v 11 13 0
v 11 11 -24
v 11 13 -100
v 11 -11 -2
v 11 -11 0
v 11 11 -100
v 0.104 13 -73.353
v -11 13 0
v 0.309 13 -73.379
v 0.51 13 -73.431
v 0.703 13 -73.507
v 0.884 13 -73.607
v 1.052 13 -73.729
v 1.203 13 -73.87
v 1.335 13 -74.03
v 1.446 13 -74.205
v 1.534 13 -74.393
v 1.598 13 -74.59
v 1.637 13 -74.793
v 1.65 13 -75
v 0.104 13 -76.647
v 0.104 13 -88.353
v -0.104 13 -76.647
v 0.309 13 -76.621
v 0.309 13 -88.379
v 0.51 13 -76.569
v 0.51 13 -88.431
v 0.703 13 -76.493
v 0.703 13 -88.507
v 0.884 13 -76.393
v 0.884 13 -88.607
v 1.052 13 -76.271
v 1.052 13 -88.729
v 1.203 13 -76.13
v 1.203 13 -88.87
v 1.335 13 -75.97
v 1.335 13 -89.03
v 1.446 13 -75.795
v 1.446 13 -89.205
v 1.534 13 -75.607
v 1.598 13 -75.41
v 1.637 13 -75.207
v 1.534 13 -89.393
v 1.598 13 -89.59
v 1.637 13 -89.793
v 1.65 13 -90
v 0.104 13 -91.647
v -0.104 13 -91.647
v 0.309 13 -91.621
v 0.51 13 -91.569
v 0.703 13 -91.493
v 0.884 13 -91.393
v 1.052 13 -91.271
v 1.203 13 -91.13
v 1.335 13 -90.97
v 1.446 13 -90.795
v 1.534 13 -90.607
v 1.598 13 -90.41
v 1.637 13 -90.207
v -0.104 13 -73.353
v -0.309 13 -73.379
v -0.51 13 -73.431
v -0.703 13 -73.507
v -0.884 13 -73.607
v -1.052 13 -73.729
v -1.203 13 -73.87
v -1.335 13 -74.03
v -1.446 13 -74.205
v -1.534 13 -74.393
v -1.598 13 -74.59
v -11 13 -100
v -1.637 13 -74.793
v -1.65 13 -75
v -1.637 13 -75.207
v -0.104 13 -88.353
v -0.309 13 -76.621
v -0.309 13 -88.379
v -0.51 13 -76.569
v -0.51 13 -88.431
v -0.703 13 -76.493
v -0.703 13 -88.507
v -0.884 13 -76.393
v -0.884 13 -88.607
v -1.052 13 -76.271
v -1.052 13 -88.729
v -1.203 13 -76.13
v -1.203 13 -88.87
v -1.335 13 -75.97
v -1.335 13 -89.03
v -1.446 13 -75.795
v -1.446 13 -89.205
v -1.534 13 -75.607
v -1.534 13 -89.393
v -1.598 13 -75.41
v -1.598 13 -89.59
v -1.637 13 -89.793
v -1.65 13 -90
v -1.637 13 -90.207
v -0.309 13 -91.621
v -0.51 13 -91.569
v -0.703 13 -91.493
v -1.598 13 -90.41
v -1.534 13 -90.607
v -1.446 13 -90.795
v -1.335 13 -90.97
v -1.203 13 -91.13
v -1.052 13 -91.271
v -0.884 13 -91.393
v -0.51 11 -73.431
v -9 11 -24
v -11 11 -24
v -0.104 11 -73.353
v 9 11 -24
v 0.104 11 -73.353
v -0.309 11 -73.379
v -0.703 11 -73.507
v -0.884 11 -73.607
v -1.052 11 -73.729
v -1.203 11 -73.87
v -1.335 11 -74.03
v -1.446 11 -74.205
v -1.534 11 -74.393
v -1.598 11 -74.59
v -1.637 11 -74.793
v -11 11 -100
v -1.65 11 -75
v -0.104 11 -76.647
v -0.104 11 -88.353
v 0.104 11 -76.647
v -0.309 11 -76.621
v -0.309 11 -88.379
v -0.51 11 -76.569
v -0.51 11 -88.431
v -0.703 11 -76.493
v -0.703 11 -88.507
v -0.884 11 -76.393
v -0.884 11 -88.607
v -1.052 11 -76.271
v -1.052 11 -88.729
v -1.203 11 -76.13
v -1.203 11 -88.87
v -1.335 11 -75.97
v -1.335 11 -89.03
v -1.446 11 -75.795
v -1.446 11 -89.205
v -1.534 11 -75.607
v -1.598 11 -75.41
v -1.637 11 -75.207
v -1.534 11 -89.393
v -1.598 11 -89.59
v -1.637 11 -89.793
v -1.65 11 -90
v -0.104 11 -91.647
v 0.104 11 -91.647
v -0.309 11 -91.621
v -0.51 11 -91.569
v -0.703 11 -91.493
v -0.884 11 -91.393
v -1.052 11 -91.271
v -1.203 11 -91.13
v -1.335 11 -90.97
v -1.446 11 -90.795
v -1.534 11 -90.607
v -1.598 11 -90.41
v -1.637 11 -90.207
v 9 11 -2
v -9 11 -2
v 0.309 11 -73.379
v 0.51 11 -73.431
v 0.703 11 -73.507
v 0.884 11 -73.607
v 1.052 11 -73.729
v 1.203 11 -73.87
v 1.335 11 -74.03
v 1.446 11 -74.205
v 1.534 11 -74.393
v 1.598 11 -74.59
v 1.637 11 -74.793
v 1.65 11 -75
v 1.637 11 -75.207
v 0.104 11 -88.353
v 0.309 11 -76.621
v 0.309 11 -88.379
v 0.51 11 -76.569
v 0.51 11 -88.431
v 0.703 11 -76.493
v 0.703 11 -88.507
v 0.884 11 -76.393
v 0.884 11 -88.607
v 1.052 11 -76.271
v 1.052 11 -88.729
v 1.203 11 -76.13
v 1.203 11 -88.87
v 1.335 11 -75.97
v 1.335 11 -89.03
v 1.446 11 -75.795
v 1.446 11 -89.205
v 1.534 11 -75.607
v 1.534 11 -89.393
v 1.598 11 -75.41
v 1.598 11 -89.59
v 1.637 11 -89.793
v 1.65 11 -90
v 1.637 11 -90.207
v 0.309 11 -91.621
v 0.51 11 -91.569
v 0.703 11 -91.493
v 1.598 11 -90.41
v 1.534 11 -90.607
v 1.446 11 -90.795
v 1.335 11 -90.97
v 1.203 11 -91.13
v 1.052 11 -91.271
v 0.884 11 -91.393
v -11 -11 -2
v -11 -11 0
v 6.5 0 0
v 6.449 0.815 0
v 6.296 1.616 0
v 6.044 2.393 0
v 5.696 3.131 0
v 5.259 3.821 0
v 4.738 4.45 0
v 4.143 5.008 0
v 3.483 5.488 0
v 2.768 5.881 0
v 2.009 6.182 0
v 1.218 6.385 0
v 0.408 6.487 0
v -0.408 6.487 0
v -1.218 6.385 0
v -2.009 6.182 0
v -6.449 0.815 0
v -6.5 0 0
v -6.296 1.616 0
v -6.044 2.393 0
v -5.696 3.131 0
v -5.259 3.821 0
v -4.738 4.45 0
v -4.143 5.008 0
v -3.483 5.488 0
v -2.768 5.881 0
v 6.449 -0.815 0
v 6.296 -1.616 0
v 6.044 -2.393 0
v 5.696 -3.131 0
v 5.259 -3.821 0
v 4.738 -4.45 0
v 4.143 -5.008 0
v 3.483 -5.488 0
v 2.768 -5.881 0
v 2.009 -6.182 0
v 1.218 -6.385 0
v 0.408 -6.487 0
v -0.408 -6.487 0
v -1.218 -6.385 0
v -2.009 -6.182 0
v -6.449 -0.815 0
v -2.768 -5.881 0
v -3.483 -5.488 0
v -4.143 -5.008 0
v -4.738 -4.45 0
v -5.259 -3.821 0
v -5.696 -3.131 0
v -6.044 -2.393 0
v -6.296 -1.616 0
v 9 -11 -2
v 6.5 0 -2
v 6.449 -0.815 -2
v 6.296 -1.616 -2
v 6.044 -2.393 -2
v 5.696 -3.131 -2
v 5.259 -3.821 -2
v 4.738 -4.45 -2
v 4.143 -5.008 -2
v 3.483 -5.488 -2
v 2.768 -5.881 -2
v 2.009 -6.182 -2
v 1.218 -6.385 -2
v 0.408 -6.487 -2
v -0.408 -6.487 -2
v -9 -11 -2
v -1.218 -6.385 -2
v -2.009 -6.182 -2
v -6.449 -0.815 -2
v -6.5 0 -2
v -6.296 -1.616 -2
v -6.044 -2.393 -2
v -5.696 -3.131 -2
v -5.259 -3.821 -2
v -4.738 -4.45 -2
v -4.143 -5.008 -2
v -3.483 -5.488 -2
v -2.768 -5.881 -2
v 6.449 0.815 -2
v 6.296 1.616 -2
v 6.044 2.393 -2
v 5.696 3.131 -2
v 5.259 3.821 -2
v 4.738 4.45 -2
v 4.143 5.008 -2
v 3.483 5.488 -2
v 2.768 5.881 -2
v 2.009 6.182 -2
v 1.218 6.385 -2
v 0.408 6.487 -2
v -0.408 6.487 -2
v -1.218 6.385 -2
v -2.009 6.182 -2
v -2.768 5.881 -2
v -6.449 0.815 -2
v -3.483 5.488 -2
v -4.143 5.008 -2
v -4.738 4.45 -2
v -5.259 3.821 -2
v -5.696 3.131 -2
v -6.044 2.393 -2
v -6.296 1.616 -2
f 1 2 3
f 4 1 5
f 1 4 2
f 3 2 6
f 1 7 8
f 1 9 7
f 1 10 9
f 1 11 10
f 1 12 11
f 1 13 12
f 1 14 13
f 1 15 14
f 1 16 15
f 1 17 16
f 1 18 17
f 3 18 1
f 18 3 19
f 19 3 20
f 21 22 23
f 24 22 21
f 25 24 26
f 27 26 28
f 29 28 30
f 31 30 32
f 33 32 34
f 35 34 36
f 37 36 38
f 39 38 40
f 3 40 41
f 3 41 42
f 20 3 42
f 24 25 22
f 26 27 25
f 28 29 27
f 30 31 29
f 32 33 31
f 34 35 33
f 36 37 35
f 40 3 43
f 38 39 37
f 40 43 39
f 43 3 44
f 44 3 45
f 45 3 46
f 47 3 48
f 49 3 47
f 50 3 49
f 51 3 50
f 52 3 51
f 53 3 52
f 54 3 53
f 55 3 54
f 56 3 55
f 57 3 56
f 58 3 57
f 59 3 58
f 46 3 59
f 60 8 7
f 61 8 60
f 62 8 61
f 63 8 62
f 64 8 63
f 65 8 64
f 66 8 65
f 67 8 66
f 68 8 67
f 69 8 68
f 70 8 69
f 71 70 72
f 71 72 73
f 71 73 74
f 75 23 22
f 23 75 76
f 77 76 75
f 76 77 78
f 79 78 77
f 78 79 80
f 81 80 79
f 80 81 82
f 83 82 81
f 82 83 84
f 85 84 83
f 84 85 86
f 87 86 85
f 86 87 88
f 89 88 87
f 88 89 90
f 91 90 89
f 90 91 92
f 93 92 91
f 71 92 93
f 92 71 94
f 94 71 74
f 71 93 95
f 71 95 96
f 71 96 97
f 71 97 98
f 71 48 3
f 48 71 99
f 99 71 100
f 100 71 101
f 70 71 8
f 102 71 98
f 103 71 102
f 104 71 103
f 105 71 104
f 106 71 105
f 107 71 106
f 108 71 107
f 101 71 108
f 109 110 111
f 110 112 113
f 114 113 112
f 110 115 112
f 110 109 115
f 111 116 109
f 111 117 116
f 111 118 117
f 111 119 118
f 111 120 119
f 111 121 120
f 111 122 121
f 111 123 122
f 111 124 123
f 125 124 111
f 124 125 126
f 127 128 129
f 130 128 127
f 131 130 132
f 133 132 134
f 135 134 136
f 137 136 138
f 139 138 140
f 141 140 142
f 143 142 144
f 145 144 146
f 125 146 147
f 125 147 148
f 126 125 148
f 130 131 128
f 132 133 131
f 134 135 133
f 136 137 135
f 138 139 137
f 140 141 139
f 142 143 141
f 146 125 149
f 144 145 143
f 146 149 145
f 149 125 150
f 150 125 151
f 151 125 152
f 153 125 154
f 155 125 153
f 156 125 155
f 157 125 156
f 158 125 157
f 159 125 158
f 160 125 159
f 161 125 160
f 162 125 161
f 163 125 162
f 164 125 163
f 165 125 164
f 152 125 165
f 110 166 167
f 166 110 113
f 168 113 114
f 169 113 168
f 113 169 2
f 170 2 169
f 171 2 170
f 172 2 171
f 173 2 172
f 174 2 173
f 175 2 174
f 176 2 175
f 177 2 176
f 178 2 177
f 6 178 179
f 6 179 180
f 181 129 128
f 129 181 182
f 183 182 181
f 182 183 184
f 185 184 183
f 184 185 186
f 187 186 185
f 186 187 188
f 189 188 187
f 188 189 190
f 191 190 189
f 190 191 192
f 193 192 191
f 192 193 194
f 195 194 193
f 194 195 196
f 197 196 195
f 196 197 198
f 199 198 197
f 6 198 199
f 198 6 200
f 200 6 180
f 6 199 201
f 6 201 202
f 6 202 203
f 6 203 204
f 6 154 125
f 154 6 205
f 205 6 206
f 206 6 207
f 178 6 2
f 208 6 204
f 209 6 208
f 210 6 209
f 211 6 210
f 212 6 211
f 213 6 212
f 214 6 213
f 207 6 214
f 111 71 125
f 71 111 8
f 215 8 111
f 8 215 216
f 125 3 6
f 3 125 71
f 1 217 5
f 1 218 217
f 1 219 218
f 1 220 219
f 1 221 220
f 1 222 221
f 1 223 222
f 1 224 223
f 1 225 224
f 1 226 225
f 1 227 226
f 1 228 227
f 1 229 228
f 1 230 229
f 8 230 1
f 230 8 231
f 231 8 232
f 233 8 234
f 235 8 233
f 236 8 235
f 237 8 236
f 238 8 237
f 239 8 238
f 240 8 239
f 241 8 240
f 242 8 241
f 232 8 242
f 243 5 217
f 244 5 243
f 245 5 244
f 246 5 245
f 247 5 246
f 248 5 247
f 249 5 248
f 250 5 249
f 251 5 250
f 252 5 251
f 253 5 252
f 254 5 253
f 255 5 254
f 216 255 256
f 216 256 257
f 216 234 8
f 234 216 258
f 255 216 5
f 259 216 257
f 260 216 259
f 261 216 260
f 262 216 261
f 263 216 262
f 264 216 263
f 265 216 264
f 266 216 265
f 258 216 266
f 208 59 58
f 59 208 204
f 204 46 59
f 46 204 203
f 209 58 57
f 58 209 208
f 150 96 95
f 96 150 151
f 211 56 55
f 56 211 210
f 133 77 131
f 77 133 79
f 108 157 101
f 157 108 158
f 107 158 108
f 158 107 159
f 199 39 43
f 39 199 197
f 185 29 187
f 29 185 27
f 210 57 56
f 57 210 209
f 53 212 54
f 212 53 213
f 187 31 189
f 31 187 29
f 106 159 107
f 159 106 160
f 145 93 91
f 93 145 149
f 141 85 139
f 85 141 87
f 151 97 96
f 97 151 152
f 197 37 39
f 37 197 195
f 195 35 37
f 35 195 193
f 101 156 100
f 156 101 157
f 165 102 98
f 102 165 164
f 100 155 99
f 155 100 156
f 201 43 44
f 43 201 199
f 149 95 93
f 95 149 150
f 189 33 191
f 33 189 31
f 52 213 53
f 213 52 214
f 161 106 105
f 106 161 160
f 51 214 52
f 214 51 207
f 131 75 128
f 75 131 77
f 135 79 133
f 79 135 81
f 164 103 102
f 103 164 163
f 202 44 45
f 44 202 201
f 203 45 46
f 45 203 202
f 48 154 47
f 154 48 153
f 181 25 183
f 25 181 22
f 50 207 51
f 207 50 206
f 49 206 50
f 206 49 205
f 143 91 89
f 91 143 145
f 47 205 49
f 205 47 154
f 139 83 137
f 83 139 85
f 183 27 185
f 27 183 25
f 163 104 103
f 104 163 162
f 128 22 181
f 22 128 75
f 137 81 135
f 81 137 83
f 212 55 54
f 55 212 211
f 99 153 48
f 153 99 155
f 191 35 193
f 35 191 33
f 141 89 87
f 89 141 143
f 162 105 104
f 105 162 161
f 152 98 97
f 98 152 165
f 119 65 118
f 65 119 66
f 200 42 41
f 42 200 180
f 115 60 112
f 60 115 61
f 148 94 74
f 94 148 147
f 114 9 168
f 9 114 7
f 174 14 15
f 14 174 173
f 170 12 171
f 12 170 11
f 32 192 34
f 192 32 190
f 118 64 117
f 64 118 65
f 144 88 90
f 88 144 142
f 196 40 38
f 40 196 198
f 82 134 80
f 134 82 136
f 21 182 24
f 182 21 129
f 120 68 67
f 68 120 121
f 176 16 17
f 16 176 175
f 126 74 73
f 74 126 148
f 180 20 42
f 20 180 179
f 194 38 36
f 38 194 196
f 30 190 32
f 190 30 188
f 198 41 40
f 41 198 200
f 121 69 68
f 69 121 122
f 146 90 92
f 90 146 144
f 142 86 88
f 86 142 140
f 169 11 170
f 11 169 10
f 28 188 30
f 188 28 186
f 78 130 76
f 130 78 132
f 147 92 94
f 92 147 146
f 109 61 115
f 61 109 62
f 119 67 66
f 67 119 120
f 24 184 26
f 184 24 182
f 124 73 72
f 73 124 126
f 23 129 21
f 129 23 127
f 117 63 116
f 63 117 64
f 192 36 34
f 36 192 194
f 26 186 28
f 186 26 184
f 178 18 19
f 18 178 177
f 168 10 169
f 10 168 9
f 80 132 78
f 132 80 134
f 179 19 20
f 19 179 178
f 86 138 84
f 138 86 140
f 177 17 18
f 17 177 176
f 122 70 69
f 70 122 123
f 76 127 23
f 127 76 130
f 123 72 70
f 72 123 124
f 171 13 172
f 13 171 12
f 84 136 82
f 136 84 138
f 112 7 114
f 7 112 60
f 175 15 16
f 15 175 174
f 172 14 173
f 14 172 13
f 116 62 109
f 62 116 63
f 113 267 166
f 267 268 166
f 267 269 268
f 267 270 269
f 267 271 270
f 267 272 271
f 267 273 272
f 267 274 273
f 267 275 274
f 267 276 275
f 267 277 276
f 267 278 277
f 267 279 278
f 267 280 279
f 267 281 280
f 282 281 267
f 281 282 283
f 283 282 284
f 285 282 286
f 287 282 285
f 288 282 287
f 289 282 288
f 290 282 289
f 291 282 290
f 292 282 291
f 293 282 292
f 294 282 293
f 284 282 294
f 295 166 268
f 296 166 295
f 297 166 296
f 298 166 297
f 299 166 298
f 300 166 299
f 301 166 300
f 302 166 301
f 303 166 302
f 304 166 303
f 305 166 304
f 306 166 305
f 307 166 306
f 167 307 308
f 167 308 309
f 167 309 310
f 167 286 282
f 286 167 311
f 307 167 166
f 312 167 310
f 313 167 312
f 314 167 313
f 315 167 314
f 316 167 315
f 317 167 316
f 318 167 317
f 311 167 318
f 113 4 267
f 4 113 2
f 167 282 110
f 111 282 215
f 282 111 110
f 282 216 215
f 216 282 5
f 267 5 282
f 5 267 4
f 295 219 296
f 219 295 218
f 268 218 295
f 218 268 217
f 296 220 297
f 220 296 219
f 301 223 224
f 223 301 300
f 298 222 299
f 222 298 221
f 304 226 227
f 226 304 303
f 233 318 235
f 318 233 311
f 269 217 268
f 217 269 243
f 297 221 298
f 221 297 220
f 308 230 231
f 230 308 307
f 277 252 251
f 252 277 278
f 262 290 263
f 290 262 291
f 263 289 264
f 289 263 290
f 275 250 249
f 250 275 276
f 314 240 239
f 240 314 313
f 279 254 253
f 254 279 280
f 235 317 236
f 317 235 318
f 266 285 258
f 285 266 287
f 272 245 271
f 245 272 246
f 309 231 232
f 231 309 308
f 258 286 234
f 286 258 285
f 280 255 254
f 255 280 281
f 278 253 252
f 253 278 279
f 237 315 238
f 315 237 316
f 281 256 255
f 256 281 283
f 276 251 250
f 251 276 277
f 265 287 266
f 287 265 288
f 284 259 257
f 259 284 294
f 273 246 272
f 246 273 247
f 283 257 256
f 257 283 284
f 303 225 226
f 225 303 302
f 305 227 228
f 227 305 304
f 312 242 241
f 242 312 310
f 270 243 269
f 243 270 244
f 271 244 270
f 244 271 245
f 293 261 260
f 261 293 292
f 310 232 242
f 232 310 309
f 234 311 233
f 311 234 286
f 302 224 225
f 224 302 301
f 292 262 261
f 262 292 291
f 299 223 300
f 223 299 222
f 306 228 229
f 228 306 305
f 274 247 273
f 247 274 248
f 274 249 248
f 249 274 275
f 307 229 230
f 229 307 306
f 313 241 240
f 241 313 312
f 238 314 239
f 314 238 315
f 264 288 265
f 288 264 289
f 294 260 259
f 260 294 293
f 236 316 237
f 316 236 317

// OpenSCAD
sma_diameter = 6.5;
wall_thickness = 2;
pad_size = 22;
stand_height = 100;
mount_hole_size = 3.3;
$fn = 50;
translate([-pad_size/2, pad_size/2, 0])rotate([-90, 0, 0])difference(){
    cube([pad_size, stand_height, wall_thickness]);
    translate([pad_size/2, stand_height-10, 0])cylinder(wall_thickness, mount_hole_size/2, mount_hole_size/2);
    translate([pad_size/2, stand_height-25, 0])cylinder(wall_thickness, mount_hole_size/2, mount_hole_size/2);
}
module pad_with_hole(hole_diameter, pad_size, wall_thickness) {
    translate([0, 0, -wall_thickness])union(){
    union(){
        translate([pad_size/2-wall_thickness, 0, 0])rotate([0,90,0])linear_extrude(wall_thickness)polygon([[0, -pad_size/2],[0, pad_size/2],[pad_size, pad_size/2]]);
        mirror([1, 0, 0]){
            translate([pad_size/2-wall_thickness, 0, 0])rotate([0,90,0])linear_extrude(wall_thickness)polygon([[0, -pad_size/2],[0, pad_size/2],[pad_size, pad_size/2]]);
        }
    }
    difference(){
        linear_extrude(wall_thickness)square([pad_size, pad_size], center=true);
        translate([0,0,-wall_thickness/2])cylinder(wall_thickness*2, hole_diameter, hole_diameter);
    }
    }
}

pad_with_hole(sma_diameter, pad_size, wall_thickness);
